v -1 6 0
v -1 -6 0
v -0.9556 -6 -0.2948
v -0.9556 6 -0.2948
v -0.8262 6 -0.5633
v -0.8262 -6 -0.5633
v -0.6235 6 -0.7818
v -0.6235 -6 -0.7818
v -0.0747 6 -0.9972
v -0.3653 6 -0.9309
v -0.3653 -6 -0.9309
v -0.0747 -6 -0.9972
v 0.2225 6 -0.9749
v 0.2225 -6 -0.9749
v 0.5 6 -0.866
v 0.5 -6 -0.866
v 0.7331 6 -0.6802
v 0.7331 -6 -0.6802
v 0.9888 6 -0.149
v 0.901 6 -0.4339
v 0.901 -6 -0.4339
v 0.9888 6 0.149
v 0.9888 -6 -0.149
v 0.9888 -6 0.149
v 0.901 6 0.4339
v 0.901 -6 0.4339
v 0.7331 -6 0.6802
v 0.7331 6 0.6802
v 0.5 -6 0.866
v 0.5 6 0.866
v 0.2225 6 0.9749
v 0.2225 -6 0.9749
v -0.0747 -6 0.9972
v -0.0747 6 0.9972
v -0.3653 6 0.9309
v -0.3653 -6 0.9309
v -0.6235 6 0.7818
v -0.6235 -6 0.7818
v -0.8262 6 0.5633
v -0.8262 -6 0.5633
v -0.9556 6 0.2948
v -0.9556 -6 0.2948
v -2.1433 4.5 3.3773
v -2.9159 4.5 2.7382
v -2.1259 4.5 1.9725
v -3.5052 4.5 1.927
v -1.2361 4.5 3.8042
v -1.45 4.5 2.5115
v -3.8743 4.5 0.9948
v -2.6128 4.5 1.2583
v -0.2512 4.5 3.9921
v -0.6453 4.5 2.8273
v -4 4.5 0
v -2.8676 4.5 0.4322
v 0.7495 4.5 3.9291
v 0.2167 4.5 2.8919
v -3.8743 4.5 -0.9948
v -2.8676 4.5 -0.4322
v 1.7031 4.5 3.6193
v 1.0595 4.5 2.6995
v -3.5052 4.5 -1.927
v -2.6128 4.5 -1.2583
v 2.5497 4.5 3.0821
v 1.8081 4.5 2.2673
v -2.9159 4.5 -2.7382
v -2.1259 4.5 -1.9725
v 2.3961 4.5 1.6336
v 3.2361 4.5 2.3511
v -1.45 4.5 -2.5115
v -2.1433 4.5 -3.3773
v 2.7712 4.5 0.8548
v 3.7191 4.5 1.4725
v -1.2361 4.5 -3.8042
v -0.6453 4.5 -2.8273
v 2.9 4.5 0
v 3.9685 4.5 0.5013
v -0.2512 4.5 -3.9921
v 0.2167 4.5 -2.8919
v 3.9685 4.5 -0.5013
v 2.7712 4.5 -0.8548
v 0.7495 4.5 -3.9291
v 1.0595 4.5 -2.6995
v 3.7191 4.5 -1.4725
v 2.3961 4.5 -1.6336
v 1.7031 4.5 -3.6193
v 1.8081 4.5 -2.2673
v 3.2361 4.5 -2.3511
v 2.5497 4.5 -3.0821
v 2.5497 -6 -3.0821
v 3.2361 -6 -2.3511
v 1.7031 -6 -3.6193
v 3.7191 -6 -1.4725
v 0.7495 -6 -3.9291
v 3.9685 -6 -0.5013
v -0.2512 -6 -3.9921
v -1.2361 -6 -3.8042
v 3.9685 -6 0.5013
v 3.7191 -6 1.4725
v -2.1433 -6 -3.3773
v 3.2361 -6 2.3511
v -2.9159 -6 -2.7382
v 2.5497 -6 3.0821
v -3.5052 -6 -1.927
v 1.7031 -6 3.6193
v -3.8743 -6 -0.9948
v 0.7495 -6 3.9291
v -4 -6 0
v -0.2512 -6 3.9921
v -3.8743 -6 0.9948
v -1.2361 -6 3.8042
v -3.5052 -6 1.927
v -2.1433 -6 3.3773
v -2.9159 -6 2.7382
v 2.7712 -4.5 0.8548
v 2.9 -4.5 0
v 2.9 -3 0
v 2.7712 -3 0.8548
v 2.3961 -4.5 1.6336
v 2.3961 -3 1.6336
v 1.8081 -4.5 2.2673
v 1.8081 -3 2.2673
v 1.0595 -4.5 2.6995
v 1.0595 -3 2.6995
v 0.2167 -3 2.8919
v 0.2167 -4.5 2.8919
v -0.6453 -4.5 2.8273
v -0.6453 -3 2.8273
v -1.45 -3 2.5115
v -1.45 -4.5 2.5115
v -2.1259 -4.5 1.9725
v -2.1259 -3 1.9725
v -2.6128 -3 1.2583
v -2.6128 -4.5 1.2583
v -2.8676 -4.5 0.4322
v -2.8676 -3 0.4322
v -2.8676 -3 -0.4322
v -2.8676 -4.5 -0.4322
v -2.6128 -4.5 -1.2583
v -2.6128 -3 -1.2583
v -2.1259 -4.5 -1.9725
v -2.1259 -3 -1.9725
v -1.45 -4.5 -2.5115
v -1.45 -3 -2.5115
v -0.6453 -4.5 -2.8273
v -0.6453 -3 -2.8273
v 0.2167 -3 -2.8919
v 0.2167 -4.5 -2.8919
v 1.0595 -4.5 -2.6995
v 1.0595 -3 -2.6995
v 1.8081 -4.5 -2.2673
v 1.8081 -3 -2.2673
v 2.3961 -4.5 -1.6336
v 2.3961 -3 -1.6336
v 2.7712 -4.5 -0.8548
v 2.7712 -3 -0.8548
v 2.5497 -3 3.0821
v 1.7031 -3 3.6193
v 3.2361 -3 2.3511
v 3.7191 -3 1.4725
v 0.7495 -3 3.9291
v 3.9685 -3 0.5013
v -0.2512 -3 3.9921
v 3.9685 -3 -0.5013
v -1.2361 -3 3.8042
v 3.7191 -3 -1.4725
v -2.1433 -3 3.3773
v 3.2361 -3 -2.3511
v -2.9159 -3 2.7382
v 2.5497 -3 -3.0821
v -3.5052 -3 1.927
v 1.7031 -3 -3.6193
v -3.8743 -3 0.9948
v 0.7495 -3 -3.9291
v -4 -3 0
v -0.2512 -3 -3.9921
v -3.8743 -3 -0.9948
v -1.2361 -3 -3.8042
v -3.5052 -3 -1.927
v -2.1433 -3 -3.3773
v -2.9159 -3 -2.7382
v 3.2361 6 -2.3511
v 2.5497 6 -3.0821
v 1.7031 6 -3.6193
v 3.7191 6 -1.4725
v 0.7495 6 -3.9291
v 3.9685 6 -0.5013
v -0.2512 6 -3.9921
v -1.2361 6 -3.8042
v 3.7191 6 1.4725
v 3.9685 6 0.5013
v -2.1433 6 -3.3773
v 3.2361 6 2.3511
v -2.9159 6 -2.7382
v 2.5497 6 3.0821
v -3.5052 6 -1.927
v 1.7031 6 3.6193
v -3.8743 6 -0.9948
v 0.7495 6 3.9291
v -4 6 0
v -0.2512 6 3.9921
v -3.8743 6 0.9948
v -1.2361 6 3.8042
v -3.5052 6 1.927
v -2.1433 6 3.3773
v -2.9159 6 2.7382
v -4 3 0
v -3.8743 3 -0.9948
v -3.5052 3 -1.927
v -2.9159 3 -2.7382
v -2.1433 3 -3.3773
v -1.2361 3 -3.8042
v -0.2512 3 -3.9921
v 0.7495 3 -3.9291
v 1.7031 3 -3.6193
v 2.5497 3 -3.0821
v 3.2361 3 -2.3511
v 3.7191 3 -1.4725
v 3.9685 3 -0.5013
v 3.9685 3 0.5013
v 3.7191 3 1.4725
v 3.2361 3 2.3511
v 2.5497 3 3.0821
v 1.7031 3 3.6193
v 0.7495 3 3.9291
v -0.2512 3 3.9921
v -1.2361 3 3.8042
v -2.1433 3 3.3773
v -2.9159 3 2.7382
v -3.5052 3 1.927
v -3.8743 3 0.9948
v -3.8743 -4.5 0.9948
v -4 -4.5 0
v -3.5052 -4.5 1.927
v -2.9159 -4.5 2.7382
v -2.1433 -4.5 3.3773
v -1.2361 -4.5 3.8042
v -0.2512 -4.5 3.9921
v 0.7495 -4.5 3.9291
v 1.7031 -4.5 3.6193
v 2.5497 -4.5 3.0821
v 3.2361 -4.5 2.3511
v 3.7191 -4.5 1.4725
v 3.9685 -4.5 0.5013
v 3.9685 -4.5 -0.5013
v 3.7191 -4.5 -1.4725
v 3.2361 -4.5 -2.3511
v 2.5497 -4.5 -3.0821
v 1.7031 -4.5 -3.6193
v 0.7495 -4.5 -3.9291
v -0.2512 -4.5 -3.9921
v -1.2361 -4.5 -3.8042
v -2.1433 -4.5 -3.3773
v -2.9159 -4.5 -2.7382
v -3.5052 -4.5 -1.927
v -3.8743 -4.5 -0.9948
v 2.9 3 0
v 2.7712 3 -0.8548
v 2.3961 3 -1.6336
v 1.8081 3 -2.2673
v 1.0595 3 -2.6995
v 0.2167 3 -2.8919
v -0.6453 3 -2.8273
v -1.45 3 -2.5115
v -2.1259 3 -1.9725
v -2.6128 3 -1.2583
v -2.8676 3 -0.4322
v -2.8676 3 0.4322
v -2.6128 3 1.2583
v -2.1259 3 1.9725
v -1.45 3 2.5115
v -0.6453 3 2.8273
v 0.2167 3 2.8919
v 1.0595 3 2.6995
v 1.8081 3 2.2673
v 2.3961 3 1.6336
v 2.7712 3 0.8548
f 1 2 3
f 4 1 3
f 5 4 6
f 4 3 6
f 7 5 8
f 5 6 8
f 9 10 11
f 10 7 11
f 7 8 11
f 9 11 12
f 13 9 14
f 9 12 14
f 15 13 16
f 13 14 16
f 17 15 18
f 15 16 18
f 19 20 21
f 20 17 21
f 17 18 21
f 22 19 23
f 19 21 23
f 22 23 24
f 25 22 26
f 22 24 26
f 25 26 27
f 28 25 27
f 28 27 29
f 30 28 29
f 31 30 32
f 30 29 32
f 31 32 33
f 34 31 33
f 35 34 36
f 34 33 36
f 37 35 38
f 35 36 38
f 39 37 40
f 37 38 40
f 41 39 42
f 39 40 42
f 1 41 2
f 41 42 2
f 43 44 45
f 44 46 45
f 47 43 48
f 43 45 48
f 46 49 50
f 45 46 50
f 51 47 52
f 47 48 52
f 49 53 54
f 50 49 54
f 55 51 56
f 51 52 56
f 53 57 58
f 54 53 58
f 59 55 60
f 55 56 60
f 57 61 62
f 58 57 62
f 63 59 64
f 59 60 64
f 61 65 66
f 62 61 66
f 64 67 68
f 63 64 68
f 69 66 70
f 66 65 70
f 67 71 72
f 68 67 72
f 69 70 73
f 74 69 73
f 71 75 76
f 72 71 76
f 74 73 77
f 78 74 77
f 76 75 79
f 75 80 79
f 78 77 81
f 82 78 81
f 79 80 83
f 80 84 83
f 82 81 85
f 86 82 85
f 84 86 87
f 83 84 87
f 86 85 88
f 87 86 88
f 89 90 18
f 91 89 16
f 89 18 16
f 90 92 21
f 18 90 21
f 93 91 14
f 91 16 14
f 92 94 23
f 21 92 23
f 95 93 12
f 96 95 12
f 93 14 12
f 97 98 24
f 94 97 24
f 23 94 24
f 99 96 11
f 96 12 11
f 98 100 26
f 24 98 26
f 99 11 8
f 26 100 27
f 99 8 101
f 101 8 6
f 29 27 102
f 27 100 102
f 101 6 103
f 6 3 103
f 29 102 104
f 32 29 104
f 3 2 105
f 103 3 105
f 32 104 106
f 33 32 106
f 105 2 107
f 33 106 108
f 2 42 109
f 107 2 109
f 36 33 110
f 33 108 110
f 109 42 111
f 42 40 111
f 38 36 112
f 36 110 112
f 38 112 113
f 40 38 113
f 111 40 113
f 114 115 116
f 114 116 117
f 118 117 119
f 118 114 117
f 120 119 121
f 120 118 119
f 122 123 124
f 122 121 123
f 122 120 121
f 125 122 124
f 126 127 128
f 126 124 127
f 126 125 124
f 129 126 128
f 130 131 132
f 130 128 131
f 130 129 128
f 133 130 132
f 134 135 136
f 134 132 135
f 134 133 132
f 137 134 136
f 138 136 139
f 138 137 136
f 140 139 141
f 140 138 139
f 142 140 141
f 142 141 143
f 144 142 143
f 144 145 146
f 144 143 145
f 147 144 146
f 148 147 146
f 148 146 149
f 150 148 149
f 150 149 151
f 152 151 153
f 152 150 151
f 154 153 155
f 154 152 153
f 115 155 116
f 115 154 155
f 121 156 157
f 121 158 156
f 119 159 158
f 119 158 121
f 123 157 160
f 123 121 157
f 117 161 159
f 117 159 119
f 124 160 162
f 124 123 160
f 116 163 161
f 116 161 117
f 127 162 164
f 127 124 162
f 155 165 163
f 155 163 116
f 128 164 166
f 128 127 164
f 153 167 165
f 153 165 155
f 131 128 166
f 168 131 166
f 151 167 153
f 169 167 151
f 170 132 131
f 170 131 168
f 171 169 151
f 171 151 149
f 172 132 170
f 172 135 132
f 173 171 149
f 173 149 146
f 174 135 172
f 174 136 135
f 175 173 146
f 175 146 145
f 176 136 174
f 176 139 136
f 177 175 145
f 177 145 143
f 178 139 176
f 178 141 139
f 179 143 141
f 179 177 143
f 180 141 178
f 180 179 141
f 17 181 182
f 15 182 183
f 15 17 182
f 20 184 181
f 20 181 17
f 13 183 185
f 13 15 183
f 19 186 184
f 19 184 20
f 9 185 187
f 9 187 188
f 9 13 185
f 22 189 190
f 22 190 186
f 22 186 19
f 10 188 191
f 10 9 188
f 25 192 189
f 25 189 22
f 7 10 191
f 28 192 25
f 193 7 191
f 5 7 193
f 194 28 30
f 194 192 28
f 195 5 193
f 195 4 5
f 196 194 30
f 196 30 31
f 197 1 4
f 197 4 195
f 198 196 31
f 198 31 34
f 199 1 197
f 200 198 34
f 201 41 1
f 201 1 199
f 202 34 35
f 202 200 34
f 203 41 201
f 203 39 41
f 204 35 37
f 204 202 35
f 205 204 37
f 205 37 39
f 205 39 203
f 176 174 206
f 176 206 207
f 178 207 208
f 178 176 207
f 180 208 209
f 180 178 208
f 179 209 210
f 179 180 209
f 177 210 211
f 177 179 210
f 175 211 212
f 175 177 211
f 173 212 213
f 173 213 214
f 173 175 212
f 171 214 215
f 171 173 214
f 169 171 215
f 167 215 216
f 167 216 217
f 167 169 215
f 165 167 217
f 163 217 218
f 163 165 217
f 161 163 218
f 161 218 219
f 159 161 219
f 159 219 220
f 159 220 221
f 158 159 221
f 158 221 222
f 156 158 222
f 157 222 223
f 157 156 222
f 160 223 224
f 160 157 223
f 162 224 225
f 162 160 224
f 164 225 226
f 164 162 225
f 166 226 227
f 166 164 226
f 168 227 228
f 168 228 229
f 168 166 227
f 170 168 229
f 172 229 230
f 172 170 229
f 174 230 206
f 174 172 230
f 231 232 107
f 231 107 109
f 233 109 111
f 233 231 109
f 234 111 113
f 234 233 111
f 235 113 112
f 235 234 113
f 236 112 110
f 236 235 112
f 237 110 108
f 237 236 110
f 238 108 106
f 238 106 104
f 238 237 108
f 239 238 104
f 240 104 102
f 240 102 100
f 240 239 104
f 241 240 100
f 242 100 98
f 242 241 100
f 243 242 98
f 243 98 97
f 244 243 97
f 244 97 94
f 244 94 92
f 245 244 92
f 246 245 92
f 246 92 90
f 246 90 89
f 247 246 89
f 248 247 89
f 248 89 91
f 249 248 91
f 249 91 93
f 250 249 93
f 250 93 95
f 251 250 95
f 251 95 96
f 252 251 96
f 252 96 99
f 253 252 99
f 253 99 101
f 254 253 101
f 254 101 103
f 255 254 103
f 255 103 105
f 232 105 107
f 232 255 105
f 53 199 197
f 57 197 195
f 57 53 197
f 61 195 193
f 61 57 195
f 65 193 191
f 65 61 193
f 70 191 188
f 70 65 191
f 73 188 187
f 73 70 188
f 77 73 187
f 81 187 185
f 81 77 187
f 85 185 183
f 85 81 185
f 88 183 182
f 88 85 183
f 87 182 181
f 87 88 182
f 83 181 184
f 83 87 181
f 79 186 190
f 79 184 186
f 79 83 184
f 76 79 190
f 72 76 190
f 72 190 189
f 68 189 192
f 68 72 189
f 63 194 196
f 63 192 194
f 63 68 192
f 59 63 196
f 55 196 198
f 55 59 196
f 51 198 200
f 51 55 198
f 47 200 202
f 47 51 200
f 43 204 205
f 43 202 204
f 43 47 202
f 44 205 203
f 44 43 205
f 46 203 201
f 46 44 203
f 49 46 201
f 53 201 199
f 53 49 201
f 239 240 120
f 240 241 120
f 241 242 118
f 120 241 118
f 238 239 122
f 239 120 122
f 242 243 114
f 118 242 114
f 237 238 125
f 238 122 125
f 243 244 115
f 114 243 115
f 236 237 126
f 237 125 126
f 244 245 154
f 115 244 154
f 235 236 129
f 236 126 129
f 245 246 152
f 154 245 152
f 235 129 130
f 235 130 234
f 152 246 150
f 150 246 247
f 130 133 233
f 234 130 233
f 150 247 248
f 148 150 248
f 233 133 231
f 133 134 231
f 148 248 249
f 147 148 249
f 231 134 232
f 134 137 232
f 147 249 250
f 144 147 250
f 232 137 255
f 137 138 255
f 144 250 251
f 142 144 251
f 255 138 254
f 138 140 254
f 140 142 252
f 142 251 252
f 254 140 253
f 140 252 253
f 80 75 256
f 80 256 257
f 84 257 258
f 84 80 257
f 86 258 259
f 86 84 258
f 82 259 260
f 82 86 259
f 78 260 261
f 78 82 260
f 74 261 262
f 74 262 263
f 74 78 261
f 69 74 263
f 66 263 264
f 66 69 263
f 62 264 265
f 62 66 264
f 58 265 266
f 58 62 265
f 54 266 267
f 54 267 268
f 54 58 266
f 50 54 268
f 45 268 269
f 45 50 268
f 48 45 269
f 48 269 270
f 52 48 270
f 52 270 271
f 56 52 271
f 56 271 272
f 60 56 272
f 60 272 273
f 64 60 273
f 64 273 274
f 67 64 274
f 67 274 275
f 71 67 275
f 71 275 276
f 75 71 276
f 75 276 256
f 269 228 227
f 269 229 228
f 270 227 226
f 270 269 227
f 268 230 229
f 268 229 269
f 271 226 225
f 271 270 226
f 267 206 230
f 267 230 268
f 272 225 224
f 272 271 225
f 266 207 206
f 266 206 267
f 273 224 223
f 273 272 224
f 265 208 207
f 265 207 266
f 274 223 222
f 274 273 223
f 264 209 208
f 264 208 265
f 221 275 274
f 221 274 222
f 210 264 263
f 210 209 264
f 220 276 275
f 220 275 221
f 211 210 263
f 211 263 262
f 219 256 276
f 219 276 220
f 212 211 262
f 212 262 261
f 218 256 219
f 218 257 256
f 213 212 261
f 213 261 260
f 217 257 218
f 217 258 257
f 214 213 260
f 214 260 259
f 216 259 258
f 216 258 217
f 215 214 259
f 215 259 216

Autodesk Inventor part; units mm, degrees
ref_plane "YZ Plane" through (0, 0, 0) normal (1, 0, 0) x (0, 1, 0)
ref_plane "XZ Plane" through (0, 0, 0) normal (0, 1, 0) x (-1, 0, 0)
sketch "Boceto1" plane through (0, 0, 0) normal (0, 1, 0) x (-1, 0, 0)
  circle A0 centre (0, 0) radius 4
  circle A1 centre (0, 0) radius 1
  dimension "d0" = 8
  dimension "d7" = 2
extrude "Extrusión1" add sketch "Boceto1" along normal mid plane 12
ref_plane "Plano de trabajo1" through (0, 4.5, 0) normal (0, 1, 0) x (1, 0, 0)
sketch "Boceto2" plane through (0, 4.5, 0) normal (0, 1, 0) x (1, 0, 0)
  circle A0 centre (0, 0) radius 4 projected
  circle A1 centre (0, 0) radius 2.9
  dimension "d4" = 5.8
extrude "Extrusión2" cut sketch "Boceto2" against normal blind 1.5
mirror "Simetría1" about plane through (0, 0, 0) normal (0, 1, 0) of "Extrusión2"
properties part number "antivibracion_3DPrint"
